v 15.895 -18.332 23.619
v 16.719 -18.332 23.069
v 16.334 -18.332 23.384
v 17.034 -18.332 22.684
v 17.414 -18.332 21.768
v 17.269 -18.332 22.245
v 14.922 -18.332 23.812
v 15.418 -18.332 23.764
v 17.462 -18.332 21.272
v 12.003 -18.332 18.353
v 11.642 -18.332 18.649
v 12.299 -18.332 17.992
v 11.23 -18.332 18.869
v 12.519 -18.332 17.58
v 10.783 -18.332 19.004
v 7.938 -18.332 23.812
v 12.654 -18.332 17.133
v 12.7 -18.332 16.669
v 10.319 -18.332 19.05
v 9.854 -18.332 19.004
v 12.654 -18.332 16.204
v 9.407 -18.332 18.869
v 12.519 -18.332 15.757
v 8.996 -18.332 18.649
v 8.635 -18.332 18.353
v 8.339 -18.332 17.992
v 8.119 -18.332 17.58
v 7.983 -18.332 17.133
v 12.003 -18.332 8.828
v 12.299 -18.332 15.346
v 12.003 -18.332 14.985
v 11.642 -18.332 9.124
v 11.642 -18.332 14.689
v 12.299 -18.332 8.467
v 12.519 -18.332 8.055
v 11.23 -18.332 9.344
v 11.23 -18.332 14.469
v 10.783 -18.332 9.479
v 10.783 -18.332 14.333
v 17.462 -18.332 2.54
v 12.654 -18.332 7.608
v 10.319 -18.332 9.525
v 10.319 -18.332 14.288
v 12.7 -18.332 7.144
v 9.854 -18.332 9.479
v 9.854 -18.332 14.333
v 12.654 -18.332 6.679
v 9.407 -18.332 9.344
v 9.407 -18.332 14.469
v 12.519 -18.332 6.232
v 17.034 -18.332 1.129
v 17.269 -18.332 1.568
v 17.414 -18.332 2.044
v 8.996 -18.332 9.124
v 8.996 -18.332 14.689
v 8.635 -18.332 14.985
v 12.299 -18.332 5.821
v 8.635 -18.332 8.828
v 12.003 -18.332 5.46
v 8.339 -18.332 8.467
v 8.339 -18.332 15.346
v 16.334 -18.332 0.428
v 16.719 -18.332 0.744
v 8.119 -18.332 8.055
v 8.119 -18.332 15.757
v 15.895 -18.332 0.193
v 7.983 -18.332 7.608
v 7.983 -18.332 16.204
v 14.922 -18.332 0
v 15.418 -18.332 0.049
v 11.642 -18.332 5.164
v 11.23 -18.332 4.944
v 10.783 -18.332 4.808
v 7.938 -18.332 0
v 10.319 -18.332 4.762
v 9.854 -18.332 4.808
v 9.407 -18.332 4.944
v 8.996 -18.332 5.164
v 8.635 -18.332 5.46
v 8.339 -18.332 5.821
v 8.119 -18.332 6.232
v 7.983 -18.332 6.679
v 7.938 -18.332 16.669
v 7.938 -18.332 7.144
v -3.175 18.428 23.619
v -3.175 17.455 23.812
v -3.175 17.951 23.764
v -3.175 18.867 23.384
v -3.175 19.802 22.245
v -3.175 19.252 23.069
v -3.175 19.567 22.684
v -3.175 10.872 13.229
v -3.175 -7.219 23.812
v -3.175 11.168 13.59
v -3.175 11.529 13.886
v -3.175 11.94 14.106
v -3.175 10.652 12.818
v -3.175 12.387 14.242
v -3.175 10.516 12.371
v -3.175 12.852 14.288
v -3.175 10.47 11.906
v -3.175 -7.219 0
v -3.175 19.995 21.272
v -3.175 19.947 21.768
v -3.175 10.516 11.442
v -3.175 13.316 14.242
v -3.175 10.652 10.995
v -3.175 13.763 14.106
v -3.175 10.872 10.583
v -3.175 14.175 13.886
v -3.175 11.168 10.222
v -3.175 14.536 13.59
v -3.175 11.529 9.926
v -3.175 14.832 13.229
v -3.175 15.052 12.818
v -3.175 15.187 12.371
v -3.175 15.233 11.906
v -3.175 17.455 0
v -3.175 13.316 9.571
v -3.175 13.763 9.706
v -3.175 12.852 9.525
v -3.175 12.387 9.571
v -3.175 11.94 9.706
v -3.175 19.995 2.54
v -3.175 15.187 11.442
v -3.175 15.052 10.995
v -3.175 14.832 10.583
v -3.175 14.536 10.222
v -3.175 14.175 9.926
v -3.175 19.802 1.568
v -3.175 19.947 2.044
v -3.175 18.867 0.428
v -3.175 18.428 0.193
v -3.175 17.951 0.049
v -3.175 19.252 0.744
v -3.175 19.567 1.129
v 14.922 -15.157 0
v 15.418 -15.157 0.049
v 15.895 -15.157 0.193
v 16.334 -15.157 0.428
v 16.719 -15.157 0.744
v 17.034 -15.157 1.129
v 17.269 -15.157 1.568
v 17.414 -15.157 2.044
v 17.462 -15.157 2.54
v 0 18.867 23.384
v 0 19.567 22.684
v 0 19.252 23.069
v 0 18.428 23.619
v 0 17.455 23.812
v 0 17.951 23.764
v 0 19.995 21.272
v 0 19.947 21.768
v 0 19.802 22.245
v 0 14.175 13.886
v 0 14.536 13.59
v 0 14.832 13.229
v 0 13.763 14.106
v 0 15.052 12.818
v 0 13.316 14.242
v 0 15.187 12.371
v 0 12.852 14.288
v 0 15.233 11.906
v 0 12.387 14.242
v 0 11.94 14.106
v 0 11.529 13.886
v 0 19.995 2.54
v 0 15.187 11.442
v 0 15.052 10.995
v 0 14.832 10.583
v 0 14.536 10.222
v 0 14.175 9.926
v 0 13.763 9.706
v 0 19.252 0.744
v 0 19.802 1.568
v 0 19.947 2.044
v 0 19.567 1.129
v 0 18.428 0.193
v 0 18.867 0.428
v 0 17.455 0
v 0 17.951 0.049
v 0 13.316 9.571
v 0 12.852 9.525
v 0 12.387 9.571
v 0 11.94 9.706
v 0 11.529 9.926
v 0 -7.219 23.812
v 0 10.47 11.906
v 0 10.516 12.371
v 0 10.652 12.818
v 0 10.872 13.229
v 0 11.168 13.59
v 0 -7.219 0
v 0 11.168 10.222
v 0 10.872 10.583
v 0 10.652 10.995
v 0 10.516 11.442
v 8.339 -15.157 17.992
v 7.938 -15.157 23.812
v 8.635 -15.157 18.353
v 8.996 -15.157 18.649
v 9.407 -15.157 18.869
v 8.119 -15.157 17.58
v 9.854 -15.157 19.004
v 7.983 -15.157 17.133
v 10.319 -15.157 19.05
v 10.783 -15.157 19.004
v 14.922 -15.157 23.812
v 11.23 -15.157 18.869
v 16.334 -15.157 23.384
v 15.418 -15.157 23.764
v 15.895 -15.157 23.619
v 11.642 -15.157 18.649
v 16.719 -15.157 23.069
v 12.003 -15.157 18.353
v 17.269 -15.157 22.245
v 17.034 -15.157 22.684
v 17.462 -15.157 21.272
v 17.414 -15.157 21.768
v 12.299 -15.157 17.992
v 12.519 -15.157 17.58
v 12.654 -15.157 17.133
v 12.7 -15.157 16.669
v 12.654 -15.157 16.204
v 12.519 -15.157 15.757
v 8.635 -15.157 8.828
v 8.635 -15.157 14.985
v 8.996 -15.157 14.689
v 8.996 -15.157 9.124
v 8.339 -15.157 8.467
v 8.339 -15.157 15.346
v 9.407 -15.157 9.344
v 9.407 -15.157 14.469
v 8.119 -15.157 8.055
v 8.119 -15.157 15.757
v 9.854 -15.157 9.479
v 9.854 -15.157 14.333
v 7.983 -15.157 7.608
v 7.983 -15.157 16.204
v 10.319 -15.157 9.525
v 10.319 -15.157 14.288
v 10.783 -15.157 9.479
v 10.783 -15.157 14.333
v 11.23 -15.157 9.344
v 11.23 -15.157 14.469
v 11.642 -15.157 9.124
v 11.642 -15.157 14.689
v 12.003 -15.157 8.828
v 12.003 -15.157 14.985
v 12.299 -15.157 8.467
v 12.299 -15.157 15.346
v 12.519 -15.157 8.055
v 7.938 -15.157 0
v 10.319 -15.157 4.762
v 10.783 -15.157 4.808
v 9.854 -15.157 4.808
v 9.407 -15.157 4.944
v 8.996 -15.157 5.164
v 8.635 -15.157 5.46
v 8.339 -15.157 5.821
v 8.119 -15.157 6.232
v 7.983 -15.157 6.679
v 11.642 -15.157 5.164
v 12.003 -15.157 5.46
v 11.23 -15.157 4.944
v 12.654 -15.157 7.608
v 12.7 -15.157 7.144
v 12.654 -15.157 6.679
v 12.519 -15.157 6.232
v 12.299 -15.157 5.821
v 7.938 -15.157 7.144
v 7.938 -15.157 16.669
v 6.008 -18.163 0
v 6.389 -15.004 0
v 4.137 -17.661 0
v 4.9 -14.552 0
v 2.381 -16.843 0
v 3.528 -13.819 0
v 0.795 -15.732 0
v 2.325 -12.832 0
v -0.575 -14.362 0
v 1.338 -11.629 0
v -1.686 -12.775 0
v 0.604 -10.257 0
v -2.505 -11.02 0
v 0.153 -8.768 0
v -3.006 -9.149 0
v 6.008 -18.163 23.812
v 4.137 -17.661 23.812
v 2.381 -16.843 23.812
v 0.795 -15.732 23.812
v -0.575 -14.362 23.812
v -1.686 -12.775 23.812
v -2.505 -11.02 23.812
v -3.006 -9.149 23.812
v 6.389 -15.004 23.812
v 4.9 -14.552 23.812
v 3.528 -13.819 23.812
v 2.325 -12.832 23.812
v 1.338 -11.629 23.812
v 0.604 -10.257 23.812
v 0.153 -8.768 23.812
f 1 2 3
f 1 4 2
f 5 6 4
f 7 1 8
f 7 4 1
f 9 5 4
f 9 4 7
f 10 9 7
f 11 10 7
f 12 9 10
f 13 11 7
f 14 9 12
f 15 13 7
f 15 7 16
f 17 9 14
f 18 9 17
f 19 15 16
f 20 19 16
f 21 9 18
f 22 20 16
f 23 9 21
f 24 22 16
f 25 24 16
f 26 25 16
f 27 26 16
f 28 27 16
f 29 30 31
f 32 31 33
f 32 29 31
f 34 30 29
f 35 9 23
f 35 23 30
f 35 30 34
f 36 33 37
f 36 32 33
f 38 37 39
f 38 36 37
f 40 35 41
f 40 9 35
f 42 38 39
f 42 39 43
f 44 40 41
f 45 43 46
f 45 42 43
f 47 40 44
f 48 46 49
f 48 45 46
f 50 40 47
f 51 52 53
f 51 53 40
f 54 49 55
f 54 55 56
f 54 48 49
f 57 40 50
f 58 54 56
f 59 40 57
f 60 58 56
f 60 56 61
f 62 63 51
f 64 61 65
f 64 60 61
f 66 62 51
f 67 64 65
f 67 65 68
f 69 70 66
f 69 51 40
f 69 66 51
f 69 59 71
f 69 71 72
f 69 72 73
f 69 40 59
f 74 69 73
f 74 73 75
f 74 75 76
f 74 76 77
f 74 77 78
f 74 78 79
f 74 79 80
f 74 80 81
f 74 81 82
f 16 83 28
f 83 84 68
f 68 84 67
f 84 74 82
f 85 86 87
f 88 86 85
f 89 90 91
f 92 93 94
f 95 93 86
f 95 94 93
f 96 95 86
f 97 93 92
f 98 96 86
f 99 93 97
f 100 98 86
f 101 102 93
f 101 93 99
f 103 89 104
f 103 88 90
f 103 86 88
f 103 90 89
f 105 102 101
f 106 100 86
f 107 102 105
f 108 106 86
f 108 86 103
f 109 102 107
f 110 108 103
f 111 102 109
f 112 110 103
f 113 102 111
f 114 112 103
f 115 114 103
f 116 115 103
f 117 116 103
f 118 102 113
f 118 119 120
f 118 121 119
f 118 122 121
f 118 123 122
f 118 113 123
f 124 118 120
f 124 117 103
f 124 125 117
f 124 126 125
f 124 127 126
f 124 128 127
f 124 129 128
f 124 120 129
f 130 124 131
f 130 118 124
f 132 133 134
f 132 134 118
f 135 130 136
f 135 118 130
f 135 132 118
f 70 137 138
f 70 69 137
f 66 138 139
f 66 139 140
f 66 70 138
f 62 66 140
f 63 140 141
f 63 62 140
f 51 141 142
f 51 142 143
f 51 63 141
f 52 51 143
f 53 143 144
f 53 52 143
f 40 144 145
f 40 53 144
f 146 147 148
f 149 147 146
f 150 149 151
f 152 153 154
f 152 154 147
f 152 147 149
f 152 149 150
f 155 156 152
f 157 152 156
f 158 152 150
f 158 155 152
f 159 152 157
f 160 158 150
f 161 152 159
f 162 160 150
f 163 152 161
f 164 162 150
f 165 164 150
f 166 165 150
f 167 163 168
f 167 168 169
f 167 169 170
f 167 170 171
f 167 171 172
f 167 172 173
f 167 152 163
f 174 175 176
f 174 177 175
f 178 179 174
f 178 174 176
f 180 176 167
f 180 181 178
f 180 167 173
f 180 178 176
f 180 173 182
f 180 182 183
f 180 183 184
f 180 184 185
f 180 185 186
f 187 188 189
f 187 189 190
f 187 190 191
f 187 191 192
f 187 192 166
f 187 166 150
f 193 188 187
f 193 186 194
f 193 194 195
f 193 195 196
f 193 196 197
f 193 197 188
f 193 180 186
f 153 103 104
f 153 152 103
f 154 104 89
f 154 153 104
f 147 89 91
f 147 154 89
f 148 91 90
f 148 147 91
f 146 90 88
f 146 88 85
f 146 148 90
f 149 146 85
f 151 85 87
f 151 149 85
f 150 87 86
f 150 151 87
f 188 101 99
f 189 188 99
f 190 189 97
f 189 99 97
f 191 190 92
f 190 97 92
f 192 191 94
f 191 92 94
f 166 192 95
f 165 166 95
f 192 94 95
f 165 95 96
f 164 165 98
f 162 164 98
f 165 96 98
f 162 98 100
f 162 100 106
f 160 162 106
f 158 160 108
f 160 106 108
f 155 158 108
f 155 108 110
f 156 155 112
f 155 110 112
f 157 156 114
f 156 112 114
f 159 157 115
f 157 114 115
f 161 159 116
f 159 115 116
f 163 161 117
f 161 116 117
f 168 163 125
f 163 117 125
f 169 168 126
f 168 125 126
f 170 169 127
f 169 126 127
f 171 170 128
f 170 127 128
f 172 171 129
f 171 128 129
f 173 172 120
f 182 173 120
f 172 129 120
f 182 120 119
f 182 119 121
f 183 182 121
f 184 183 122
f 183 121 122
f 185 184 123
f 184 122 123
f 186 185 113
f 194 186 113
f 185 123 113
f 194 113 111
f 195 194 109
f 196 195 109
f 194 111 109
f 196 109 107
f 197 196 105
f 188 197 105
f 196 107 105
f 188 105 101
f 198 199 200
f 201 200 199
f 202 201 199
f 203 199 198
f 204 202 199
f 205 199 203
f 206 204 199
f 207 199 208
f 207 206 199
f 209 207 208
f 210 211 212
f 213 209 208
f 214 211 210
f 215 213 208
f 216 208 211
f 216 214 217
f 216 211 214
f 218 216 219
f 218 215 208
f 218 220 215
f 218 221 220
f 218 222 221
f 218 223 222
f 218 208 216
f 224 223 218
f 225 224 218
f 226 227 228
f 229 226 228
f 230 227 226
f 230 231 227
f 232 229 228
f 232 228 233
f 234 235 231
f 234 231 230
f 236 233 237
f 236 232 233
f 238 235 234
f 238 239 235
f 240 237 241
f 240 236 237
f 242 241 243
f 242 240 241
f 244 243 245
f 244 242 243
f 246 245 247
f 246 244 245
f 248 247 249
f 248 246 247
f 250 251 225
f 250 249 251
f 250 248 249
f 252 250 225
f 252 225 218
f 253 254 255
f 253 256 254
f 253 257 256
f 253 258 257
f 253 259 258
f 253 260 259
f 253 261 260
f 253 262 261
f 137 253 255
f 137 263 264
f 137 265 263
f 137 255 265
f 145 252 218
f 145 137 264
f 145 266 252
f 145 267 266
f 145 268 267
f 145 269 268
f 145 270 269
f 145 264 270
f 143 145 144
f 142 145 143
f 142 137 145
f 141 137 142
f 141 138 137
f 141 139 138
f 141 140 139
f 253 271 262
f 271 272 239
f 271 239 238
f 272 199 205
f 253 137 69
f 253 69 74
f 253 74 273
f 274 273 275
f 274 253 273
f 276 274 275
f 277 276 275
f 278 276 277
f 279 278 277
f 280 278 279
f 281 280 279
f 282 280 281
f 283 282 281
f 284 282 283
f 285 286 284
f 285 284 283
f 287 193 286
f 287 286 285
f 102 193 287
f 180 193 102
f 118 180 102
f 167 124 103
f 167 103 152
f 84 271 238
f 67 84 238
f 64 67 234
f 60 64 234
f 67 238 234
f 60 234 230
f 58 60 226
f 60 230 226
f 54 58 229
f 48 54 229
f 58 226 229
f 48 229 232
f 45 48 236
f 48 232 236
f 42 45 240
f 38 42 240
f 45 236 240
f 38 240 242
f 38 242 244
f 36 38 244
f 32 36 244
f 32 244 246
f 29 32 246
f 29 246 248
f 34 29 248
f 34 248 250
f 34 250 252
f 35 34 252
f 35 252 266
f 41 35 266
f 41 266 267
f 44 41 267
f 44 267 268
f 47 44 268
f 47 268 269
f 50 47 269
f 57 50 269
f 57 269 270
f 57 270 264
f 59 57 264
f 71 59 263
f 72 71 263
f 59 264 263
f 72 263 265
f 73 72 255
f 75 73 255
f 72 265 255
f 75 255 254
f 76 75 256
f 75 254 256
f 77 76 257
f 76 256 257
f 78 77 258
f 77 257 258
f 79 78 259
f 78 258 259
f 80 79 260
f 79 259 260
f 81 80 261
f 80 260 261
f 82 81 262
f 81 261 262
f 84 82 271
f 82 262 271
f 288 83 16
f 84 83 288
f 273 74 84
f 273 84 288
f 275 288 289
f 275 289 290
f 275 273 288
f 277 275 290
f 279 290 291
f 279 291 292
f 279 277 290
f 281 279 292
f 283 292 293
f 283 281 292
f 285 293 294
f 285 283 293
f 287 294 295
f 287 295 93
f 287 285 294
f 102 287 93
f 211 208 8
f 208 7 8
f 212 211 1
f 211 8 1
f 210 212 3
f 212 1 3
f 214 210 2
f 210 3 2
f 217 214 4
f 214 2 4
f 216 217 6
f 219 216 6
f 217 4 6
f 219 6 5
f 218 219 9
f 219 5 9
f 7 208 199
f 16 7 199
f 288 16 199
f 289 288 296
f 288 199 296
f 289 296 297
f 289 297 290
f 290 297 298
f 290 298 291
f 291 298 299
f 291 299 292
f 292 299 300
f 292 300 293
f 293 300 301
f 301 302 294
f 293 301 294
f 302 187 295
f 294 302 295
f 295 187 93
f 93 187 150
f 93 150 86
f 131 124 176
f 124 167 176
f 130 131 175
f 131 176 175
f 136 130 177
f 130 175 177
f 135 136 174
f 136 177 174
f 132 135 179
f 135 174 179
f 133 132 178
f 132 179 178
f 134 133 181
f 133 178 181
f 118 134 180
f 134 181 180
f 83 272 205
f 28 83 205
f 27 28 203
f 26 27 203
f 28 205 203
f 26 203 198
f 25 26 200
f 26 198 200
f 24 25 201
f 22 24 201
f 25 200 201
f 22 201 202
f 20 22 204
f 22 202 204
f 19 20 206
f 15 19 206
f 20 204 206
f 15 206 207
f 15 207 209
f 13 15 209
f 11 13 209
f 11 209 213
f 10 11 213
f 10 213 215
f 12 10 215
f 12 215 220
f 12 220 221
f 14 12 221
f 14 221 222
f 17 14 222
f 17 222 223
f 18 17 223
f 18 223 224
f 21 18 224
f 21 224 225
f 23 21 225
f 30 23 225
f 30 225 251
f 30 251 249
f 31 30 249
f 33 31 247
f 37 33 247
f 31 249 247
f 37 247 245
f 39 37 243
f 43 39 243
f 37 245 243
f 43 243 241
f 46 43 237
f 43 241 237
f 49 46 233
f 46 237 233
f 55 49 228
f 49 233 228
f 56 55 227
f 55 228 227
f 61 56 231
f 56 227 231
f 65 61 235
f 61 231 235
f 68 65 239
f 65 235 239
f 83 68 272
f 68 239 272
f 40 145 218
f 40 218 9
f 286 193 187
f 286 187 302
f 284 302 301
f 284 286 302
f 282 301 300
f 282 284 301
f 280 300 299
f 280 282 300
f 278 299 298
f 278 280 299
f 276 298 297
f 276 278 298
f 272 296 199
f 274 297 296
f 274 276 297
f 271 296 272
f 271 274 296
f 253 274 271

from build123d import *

# Parameters (mm, degrees)
BOSS_EXTRUDE1_DEPTH = 23.8125
SKETCH5_R           = 2.38125
CUT_EXTRUDE2_DEPTH  = 3.175
CUT_EXTRUDE3_REACH  = 47.909
SKETCH8_R           = 2.38125
FILLET1_R           = 2.54


with BuildPart() as part:
    # Sketch1 → Boss-Extrude1 (new body)
    with BuildSketch(Plane.XY):
        with BuildLine():
            Line((0, 19.99549417), (0, -7.21908183))
            ThreePointArc((0, -7.21908183), (2.324839924, -12.831741905), (7.9375, -15.15658183))
            Line((7.9375, -15.15658183), (17.4625, -15.15658183))
            Line((17.4625, -15.15658183), (17.4625, -18.33158183))
            Line((17.4625, -18.33158183), (7.9375, -18.33158183))
            ThreePointArc((7.9375, -18.33158183), (0.079775894, -15.076805936), (-3.175, -7.21908183))
            Line((-3.175, -7.21908183), (-3.175, 19.99549417))
            Line((-3.175, 19.99549417), (0, 19.99549417))
        make_face()
    extrude(amount=BOSS_EXTRUDE1_DEPTH)

    # Sketch5 → Cut-Extrude2 (cut)
    with BuildSketch(Plane.ZY.offset(3.175)):
        with Locations(Location((11.90625, 12.85174417, 0), (0, 0, 270))):
            Circle(SKETCH5_R)
    extrude(amount=-CUT_EXTRUDE2_DEPTH, mode=Mode.SUBTRACT)

    # Sketch8 → Cut-Extrude3 (cut, up to next)
    with BuildSketch(Plane(origin=(0, -15.15658183, 0), x_dir=(1, 0, 0), z_dir=(0, 1, 0)), mode=Mode.PRIVATE) as cut_extrude3_sk1:
        with Locations(Location((10.31875, -7.14375, 0), (0, 0, 180))):
            Circle(SKETCH8_R)
    cut_extrude3_tool1 = extrude(cut_extrude3_sk1.sketch, amount=-CUT_EXTRUDE3_REACH, mode=Mode.PRIVATE) & part.part
    # Sketch8 → Cut-Extrude3 (cut, up to next)
    with BuildSketch(Plane(origin=(0, -15.15658183, 0), x_dir=(1, 0, 0), z_dir=(0, 1, 0)), mode=Mode.PRIVATE) as cut_extrude3_sk2:
        with Locations(Location((10.31875, -16.66875, 0), (0, 0, 180))):
            Circle(SKETCH8_R)
    cut_extrude3_tool2 = extrude(cut_extrude3_sk2.sketch, amount=-CUT_EXTRUDE3_REACH, mode=Mode.PRIVATE) & part.part
    add(cut_extrude3_tool1.solids().sort_by_distance((10.31875, -15.156582, 7.14375))[0], mode=Mode.SUBTRACT)
    add(cut_extrude3_tool2.solids().sort_by_distance((10.31875, -15.156582, 16.66875))[0], mode=Mode.SUBTRACT)

    # Fillet1
    fillet1_edges = [part.edges().sort_by_distance(p)[0] for p in [
        (-1.5875, 19.99549417, 0),
        (17.4625, -16.74408183, 23.8125),
        (-1.5875, 19.99549417, 23.8125),
        (17.4625, -16.74408183, 0),
    ]]
    fillet(fillet1_edges, radius=FILLET1_R)


solid = part.part
